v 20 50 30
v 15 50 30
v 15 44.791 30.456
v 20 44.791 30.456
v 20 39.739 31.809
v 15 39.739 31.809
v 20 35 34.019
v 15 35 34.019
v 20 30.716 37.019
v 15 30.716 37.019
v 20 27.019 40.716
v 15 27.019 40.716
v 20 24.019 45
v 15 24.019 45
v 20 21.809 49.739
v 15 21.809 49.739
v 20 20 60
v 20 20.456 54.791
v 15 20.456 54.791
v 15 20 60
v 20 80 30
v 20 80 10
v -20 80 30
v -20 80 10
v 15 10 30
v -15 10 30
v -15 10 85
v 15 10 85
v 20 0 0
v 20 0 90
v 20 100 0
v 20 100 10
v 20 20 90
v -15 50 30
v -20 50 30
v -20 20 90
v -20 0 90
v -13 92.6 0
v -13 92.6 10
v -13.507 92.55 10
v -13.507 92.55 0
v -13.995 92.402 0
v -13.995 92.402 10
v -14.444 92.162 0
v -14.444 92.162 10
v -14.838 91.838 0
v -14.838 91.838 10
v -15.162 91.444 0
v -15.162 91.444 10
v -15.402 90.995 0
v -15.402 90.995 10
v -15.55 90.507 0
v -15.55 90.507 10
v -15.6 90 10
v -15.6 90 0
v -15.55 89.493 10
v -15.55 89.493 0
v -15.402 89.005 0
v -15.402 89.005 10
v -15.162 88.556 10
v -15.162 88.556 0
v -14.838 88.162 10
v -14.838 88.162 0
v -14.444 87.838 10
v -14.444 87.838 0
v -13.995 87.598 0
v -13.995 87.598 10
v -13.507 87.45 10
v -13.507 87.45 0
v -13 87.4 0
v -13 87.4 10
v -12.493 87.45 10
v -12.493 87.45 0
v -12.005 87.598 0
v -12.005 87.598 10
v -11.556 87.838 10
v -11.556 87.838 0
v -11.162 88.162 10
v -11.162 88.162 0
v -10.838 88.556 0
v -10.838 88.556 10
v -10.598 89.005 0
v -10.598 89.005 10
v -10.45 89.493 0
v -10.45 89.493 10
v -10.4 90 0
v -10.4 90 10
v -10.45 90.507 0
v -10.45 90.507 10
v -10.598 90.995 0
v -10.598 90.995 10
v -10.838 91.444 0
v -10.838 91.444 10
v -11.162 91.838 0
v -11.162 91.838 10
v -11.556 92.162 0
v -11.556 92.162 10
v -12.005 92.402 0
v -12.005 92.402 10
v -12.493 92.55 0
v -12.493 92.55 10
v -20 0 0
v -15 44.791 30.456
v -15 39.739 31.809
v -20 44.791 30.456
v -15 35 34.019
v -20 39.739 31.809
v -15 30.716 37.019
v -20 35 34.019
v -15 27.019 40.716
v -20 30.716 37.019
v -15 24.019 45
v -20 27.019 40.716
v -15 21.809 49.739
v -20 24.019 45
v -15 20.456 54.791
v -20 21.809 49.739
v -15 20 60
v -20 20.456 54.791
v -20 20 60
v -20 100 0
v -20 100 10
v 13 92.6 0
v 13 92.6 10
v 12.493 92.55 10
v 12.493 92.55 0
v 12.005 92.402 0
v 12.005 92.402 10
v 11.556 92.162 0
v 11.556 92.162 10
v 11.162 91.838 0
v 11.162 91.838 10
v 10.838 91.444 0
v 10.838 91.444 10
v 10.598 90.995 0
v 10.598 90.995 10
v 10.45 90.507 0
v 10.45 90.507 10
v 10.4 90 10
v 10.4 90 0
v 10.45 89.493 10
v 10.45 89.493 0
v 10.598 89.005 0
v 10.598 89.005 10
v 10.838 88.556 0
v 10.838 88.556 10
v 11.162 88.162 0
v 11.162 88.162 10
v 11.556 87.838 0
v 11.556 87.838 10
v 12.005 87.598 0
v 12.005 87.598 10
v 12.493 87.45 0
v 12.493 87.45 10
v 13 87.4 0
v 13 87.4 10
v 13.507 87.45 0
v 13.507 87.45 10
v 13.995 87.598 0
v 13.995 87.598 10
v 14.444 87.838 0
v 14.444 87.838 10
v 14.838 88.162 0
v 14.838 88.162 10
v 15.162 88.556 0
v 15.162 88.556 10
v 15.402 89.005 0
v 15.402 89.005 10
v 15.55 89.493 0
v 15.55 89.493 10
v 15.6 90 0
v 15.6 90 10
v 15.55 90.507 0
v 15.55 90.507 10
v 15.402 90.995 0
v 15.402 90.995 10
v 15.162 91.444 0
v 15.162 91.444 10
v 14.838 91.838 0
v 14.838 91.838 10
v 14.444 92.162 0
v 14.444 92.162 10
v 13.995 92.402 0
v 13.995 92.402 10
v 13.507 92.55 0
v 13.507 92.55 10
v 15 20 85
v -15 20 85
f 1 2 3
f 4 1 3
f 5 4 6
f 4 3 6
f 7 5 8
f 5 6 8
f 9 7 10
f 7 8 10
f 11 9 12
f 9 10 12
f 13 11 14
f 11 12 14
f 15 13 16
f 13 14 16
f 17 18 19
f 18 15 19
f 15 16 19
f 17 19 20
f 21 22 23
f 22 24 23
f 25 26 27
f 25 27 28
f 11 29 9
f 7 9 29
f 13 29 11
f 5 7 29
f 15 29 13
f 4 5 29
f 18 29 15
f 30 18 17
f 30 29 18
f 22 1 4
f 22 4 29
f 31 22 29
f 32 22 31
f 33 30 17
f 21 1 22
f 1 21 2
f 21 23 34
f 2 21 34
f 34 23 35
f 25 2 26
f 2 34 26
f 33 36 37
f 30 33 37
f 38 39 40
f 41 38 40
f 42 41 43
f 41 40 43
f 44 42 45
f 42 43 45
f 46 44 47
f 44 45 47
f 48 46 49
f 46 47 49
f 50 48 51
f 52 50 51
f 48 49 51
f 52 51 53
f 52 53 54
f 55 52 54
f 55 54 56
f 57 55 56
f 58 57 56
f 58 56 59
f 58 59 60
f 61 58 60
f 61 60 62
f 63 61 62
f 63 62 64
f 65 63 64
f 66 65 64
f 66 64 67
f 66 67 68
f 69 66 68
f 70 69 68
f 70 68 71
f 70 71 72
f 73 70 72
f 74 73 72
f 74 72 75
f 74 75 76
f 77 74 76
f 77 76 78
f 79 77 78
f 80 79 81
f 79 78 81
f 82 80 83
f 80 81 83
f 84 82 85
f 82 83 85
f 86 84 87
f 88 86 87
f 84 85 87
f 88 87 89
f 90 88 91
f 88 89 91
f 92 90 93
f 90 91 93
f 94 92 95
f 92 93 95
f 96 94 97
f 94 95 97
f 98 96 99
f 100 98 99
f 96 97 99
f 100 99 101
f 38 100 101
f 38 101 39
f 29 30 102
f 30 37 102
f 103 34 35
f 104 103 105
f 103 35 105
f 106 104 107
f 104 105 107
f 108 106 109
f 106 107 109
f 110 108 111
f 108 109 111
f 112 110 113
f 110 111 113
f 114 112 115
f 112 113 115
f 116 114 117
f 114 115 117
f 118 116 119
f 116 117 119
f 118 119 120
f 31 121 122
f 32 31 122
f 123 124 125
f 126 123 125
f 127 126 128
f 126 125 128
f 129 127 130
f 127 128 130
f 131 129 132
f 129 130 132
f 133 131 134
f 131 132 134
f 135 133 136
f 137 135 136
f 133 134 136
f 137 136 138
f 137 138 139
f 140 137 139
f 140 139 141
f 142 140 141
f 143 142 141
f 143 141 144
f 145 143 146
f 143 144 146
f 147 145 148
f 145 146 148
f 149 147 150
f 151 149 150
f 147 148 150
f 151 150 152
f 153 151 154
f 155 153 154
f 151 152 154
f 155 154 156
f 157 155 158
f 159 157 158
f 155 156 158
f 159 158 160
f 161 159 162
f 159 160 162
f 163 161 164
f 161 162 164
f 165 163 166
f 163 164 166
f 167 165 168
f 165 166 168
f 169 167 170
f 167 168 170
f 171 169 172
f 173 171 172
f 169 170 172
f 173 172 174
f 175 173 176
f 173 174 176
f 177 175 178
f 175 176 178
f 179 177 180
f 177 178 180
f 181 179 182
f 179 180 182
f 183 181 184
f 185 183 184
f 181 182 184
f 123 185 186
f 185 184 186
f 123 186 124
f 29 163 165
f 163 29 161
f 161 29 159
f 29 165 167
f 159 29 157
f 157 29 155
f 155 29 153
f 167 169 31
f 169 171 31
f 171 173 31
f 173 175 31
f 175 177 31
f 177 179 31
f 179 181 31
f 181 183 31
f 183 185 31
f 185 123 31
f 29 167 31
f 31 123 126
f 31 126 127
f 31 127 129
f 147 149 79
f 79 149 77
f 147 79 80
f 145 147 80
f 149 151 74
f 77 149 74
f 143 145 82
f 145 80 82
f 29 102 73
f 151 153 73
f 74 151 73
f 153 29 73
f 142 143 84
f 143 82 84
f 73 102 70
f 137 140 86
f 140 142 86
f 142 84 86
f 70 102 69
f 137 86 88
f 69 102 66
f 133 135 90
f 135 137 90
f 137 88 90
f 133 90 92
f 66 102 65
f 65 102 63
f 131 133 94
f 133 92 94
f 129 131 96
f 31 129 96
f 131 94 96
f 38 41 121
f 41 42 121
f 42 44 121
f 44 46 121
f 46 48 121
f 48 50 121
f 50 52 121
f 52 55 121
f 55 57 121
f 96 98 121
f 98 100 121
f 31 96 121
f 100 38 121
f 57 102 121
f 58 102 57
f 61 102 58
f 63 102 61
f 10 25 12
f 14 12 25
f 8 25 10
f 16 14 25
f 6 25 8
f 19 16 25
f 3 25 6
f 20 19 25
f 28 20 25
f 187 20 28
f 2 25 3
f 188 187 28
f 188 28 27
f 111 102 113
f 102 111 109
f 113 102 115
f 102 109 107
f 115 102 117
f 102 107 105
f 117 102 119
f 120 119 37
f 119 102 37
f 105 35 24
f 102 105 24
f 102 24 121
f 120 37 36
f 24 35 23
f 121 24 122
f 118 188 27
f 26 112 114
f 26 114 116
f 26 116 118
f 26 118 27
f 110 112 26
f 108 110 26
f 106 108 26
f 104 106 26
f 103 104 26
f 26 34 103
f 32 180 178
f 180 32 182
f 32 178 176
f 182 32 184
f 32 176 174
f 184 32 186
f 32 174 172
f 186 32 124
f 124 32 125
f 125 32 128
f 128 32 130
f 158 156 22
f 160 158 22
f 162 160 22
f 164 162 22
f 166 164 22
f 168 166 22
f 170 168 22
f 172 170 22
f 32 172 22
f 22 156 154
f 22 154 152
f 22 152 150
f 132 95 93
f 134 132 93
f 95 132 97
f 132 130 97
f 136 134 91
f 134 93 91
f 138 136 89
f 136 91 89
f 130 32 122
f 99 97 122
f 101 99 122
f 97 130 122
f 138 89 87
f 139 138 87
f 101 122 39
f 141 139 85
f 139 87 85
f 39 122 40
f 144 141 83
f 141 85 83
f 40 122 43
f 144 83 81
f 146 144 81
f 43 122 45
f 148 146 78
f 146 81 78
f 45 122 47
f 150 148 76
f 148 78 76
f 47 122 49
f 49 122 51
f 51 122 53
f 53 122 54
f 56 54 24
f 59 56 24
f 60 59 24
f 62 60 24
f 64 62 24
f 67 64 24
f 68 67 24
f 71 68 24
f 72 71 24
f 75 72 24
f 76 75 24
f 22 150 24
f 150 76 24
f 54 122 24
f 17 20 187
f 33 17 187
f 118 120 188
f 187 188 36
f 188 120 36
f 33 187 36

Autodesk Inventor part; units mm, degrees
ref_plane "YZ Plane" through (0, 0, 0) normal (1, 0, 0) x (0, 1, 0)
ref_plane "XZ Plane" through (0, 0, 0) normal (0, 1, 0) x (-1, 0, 0)
ref_plane "XY Plane" through (0, 0, 0) normal (0, 0, 1) x (1, 0, 0)
sketch "スケッチ1" plane through (0, 0, 0) normal (1, 0, 0) x (0, 1, 0)
  line L0 (0, 0) -> (100, 0)
  line L1 (100, 0) -> (100, 10)
  line L2 (20, 90) -> (0, 90)
  line L3 (0, 90) -> (0, 0)
  line L4 (100, 10) -> (80, 10)
  line L5 (80, 10) -> (80, 30)
  line L6 (80, 30) -> (20, 30)
  line L7 (20, 30) -> (20, 90)
  dimension "d0" = 100
  dimension "d1" = 10
  dimension "d23" = 20
  dimension "d24" = 20
  dimension "d25" = 80
  dimension "d26" = 90
extrude "押し出し1" add sketch "スケッチ1" along normal mid plane 40
fillet "フィレット1" radius 30 1 edges at (0, 20, 30)
sketch "スケッチ2" plane through (-20, 100, 10) normal (0, 1, 0) x (1, 0, 0)
  line L0 (0, -80) -> (40, -80) projected
  line L1 (40, -20) -> (0, -20) projected
  line L2 (5, -20) -> (35, -20)
  line L3 (35, -20) -> (35, -75)
  line L4 (35, -75) -> (5, -75)
  line L5 (5, -75) -> (5, -20)
  line L6 (0, -20) -> (0, -50) projected
  line L7 (40, -50) -> (40, -80) projected
  dimension "d27" = 5
  dimension "d28" = 5
  dimension "d29" = 5
extrude "押し出し2" cut sketch "スケッチ2" against normal blind 90
sketch "スケッチ3" plane through (20, 100, 0) normal (0, 0, -1) x (-1, 0, 0)
  line L0 (40, 0) -> (0, 0) projected
  line L1 (0, -100) -> (0, 0) projected
  line L2 (40, 0) -> (40, -100) projected
  point P0 (20, -100)
  point P1 (7, -10)
  point P2 (33, -10)
  dimension "d12" = 10
  dimension "d13" = 10
  dimension "d14" = 7
  dimension "d15" = 7
hole "穴1" at (13, 90, 0) at (-13, 90, 0) direction (0, 0, 1) diameter 5.2 end through all
equation "\"d28\" = d27"
equation "\"d29\" = d27"
equation "\"d13\" = d12"
equation "\"d15\" = d14"
properties part number "s_base8"
